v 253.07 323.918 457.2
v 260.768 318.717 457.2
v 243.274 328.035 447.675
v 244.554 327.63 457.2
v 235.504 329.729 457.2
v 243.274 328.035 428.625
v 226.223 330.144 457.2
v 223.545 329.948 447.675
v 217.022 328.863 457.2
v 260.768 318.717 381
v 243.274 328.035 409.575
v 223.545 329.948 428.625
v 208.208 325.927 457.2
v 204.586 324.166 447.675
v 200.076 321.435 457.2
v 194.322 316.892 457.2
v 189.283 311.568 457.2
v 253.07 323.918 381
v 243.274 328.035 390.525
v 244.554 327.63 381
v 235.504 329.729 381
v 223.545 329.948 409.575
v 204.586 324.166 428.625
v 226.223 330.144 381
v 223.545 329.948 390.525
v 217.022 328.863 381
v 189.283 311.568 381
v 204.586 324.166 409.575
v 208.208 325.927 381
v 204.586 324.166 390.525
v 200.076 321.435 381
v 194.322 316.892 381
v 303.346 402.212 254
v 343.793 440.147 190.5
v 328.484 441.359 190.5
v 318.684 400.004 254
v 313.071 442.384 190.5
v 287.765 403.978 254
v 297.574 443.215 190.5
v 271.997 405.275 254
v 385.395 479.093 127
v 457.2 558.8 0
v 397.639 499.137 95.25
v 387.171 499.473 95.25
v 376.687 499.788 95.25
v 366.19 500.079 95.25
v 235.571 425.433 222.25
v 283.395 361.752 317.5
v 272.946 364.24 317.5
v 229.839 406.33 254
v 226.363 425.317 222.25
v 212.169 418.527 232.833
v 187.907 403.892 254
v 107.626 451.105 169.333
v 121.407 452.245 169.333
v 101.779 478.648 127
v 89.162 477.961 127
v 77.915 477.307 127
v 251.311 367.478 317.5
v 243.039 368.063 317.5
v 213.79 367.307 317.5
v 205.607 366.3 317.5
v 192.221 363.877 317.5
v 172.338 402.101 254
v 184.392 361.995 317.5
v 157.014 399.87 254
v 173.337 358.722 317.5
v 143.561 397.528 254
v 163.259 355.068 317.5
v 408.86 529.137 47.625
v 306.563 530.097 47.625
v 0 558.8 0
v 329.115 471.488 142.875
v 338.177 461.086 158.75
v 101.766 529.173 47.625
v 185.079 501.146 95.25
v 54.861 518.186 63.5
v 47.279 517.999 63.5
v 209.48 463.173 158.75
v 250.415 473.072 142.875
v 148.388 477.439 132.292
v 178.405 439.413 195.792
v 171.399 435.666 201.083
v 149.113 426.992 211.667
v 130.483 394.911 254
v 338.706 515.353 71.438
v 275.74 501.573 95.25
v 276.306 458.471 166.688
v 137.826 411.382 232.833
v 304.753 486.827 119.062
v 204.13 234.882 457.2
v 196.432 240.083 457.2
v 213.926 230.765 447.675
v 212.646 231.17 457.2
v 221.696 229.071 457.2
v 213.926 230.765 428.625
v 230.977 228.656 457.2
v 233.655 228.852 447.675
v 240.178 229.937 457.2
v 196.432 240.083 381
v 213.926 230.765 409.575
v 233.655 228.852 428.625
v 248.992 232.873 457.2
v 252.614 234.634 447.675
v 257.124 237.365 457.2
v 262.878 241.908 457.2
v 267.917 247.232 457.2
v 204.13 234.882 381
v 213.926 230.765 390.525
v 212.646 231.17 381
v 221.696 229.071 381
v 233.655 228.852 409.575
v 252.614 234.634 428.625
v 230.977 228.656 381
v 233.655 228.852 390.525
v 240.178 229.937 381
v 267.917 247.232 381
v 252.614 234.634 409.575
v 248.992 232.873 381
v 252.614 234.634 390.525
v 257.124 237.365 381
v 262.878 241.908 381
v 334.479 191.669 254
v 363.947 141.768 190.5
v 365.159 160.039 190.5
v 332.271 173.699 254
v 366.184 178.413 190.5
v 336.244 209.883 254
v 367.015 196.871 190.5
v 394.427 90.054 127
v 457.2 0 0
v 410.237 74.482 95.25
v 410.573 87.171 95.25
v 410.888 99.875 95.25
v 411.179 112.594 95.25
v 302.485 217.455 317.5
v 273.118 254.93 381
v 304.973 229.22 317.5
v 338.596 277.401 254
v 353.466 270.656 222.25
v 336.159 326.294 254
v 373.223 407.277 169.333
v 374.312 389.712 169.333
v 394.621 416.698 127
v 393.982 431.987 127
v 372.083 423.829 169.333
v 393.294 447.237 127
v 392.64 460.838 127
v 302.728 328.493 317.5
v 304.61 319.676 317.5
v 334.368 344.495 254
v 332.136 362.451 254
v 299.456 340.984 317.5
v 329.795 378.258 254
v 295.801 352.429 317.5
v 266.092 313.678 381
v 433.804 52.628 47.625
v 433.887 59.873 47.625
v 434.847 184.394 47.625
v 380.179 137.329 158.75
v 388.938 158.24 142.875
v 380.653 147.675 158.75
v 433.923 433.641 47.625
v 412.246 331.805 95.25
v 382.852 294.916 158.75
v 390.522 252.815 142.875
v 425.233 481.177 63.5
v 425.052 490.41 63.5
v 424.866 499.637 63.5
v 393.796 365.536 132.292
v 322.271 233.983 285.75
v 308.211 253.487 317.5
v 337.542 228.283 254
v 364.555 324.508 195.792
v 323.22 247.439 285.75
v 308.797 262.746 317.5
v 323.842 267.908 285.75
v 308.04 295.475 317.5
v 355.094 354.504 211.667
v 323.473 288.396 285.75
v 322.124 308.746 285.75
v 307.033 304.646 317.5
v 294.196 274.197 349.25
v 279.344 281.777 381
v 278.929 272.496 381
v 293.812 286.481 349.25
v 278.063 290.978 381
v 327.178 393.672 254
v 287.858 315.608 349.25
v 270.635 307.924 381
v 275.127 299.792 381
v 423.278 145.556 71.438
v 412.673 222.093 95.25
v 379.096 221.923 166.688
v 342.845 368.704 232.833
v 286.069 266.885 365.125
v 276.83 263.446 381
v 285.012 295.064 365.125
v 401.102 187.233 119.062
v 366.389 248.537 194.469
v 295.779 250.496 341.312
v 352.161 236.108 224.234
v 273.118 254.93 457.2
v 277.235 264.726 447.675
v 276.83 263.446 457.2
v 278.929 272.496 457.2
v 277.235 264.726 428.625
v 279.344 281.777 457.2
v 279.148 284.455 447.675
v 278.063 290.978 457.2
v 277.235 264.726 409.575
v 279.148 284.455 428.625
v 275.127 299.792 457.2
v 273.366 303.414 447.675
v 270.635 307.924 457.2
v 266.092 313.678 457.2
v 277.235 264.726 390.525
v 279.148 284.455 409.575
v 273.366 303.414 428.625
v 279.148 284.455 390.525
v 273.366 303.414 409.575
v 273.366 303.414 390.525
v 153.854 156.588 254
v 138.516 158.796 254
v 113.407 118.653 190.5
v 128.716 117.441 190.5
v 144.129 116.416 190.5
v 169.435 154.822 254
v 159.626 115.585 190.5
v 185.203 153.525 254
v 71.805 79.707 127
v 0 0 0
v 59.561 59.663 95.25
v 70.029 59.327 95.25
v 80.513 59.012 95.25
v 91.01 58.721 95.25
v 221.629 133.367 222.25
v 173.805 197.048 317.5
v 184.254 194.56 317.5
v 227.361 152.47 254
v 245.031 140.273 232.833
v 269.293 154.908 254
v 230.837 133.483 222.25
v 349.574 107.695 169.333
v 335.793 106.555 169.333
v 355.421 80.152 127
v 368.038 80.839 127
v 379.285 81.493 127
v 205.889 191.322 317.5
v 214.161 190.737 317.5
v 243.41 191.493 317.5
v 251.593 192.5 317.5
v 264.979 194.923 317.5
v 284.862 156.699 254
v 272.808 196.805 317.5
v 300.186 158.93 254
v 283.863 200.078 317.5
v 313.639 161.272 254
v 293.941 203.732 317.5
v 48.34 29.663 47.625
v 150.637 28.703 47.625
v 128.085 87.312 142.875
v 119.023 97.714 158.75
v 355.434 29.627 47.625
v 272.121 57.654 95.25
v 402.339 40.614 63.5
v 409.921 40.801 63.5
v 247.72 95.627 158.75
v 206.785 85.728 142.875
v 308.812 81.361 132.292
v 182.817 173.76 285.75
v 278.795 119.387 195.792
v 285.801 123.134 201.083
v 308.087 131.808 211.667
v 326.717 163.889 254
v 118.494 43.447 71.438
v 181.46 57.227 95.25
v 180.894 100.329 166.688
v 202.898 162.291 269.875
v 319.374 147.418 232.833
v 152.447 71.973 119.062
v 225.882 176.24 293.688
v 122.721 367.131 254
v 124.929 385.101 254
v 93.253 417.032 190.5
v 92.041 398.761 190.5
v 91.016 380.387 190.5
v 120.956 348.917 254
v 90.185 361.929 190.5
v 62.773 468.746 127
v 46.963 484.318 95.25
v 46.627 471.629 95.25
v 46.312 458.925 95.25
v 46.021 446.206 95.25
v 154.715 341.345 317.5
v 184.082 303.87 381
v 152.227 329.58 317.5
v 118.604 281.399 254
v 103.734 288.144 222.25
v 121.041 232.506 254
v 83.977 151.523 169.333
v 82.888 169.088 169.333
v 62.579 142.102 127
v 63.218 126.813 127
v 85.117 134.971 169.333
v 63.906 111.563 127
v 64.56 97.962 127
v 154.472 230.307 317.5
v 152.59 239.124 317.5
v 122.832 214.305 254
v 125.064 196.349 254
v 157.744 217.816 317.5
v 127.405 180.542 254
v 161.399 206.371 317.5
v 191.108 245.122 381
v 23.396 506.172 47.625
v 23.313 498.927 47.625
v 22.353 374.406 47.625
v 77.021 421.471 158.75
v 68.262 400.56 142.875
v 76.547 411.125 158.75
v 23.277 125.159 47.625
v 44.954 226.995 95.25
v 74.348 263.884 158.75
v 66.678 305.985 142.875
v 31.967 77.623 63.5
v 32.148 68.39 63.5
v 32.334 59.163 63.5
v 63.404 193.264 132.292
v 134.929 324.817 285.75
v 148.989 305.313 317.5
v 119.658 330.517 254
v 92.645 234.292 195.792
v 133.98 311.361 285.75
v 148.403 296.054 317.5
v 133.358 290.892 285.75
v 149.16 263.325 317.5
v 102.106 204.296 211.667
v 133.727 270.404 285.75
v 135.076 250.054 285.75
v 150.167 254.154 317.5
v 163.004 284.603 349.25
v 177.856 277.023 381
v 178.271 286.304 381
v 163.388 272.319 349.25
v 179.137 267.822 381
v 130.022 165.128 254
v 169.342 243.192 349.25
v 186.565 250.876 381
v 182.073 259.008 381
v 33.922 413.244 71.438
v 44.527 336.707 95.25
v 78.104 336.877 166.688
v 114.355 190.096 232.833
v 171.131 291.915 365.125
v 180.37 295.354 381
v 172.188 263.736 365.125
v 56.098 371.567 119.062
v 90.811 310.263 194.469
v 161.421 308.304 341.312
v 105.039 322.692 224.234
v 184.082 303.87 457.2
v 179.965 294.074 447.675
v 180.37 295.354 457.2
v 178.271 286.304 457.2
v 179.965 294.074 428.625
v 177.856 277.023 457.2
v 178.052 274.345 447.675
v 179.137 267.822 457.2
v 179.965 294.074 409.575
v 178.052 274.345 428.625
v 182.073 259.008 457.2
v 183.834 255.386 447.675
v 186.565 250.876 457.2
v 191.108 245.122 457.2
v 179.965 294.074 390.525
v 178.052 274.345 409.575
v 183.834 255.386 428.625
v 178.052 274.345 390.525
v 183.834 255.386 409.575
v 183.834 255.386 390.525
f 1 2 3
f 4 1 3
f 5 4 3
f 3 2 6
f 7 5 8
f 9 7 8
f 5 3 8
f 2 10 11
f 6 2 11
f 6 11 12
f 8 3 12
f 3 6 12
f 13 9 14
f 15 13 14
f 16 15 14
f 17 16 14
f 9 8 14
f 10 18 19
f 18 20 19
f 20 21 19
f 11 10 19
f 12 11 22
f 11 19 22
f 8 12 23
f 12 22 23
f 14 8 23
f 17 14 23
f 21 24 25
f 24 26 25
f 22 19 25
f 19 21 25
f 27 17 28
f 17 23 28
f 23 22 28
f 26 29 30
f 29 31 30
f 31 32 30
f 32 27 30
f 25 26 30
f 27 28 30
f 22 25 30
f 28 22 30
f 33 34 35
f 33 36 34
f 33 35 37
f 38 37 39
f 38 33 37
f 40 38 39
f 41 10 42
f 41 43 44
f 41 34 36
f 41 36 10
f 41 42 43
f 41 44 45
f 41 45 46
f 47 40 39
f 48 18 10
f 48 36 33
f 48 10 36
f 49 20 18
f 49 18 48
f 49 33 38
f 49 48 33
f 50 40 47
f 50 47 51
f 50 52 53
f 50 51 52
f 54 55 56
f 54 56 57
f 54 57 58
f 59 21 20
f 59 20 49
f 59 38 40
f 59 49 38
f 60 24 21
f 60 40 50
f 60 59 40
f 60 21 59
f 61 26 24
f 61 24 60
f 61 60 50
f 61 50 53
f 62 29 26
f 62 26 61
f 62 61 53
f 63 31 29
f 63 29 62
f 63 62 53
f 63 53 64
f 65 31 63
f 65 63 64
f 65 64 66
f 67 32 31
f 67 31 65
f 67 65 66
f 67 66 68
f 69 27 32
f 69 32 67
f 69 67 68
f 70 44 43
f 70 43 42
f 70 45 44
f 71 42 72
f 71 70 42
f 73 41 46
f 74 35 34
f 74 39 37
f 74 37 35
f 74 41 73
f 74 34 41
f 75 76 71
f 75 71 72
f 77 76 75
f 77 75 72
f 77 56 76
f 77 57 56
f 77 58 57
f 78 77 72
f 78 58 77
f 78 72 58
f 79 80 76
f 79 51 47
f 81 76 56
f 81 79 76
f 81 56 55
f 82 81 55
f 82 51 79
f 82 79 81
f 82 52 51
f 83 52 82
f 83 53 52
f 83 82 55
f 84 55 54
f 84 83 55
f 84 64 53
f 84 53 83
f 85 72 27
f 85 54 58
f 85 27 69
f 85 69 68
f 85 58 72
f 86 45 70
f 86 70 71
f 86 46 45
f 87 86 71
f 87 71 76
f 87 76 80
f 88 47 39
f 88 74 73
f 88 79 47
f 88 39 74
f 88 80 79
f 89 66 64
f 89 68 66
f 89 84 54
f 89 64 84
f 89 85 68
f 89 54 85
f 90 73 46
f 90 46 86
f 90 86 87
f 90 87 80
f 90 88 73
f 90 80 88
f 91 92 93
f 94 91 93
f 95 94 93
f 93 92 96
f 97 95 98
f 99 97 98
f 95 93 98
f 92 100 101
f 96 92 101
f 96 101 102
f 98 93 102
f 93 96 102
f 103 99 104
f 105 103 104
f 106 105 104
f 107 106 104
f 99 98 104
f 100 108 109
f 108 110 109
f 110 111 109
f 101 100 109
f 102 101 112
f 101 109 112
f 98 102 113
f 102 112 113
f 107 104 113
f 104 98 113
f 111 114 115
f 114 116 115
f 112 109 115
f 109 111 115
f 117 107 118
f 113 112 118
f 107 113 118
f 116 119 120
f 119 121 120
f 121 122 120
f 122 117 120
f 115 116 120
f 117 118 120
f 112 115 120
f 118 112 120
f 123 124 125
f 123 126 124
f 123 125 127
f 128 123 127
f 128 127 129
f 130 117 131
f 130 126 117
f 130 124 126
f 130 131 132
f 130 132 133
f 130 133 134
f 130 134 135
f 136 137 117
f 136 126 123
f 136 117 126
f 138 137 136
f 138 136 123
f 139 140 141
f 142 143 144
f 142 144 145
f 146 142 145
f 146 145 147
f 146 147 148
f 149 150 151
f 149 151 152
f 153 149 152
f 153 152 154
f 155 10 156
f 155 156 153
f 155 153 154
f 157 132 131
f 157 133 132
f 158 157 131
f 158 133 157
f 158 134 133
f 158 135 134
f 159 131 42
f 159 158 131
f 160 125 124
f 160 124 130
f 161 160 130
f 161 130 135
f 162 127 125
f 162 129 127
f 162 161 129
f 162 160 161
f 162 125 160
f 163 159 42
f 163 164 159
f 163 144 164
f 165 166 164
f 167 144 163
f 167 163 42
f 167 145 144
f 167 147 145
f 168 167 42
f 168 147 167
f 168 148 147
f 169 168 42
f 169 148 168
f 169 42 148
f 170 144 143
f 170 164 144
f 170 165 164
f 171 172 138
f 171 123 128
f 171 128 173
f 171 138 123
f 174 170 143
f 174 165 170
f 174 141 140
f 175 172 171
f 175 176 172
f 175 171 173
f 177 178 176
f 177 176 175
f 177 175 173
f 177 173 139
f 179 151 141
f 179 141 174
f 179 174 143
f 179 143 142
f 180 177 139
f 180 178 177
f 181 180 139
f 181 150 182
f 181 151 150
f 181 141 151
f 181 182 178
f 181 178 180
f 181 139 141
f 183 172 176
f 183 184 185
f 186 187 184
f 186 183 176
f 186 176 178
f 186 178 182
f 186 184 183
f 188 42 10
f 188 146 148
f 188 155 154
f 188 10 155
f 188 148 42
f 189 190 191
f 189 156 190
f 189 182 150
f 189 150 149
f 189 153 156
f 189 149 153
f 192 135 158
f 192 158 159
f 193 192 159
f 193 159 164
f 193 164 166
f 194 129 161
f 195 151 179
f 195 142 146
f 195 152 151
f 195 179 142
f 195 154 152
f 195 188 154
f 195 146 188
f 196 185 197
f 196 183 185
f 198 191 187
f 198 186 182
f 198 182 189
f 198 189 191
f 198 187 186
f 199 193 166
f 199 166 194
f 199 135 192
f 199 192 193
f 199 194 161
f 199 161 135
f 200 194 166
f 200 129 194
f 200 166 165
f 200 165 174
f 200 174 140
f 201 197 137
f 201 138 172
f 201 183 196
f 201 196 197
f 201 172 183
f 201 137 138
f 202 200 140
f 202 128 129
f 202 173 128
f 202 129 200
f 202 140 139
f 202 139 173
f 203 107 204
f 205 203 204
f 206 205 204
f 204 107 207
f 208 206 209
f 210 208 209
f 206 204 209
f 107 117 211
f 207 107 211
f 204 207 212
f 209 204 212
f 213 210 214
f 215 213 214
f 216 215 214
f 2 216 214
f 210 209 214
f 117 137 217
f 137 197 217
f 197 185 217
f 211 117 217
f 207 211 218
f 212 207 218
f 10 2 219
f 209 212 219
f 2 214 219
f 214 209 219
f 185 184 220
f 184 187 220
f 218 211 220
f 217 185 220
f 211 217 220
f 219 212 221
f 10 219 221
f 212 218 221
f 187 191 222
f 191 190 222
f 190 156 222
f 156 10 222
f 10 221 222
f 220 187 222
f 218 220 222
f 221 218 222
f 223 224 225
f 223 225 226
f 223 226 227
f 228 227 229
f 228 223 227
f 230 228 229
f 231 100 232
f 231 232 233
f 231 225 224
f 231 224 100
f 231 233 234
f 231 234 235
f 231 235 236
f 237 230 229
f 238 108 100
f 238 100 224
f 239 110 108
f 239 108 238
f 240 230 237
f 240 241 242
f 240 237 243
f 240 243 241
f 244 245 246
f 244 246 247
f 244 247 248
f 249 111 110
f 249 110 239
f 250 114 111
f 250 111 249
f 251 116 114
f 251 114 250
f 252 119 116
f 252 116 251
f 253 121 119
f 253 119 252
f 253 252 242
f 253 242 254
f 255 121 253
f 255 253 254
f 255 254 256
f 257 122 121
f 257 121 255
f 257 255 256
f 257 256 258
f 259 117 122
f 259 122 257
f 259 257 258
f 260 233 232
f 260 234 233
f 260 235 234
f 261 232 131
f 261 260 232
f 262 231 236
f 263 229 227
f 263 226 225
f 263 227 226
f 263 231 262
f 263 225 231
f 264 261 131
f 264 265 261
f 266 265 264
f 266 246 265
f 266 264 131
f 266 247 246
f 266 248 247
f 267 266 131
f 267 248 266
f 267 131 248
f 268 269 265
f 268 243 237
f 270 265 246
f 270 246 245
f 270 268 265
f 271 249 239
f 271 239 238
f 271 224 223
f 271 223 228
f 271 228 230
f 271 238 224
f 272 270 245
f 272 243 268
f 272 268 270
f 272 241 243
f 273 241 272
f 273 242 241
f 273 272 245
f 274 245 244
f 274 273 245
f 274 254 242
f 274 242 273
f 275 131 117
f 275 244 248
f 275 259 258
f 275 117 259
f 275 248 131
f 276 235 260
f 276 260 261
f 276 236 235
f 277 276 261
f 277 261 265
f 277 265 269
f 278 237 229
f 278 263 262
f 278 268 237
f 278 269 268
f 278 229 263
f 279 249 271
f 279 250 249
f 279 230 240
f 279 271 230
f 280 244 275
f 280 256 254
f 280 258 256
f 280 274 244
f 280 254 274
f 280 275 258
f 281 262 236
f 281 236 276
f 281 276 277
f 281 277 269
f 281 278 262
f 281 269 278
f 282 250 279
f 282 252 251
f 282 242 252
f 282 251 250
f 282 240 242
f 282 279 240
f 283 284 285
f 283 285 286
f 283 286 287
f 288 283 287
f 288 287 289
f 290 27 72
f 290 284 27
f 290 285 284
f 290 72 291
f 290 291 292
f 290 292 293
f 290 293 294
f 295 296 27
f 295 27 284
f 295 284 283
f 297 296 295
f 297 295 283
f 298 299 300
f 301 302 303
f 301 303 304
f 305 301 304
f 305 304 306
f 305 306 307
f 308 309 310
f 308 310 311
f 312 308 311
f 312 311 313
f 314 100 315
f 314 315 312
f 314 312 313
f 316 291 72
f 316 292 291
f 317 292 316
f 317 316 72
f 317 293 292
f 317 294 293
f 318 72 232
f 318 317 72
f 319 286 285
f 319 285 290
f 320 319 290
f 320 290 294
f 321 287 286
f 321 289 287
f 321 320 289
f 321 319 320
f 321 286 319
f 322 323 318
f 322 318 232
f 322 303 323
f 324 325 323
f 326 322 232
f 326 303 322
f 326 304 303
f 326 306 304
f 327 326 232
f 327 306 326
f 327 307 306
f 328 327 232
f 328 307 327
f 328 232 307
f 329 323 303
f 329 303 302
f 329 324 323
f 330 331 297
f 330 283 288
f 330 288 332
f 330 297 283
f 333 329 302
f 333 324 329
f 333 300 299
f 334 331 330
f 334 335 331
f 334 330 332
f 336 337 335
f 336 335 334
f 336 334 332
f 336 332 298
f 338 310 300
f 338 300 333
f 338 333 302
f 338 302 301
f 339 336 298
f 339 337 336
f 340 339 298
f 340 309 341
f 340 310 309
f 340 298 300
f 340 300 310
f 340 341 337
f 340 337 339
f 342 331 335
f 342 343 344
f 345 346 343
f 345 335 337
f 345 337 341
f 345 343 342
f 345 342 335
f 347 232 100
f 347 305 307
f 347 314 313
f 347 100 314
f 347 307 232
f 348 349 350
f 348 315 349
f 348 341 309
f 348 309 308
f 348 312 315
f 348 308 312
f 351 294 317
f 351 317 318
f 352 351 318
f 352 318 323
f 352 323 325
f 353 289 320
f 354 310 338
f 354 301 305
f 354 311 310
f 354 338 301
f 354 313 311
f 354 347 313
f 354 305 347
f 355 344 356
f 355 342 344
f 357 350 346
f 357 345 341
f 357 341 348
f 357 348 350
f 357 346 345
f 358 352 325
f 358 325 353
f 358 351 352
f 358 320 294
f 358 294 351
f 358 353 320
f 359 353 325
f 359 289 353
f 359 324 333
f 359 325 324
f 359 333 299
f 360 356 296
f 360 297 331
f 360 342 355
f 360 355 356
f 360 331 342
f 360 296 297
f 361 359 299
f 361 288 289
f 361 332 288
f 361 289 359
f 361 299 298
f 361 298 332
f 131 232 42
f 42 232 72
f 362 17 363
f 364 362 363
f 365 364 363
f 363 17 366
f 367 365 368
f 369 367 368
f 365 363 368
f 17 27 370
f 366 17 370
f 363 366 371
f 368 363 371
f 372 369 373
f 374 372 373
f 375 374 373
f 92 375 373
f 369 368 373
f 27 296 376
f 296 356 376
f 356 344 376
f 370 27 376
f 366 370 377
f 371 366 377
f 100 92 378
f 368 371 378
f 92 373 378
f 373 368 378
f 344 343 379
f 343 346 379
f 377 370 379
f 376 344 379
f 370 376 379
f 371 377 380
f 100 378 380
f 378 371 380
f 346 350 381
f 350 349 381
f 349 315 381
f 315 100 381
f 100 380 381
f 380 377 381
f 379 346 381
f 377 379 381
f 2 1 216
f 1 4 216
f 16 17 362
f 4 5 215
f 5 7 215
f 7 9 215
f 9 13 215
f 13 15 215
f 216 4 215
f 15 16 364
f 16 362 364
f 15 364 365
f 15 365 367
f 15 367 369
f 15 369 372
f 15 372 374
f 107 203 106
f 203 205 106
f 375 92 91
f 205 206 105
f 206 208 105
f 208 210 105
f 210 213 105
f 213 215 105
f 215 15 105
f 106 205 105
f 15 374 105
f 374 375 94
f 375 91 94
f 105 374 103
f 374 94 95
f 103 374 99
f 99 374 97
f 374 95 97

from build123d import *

# Parameters (mm, degrees)
F0_W     = 457.2
F0_H     = 558.8
F4_DEPTH = 76.2


# Not quite as in the source:
# - the arcs of a loft's sections are written as splines that run evenly, so that the points pair up as in the source's solid


with BuildPart() as f3:
    # F0 (on Top) → F3 section 0
    with BuildSketch(Plane.XY):
        with Locations((228.6, 279.4)):
            Rectangle(F0_W, F0_H)
    # F2 (on offset) → F3 section 1
    with BuildSketch(Plane.XY.offset(381)):
        with BuildLine():
            add(Edge.make_bspline(
                [(196.4315202549, 240.0829692005), (199.0048139033, 237.9775471245), (201.7854047693, 236.125618145), (207.6545967757, 232.9997335558), (210.7430527889, 231.7258552398), (217.1092997477, 229.805056205), (220.3869332755, 229.1581829817), (227.0055838864, 228.516284731), (230.3464373104, 228.5212755757), (236.9631405421, 229.1829458989), (240.2388267389, 229.8396090163), (246.599306397, 231.7794202939), (249.6839425829, 233.0625204885), (255.5437690011, 236.205926861), (258.3188143375, 238.066155312), (263.4527976727, 242.2923574354), (265.8116087236, 244.6582266066), (267.9170307995, 247.2315202549)],
                knots=[0, 0, 0, 0, 0.125, 0.125, 0.25, 0.25, 0.375, 0.375, 0.5, 0.5, 0.625, 0.625, 0.75, 0.75, 0.875, 0.875, 1, 1, 1, 1], degree=3))
            add(Edge.make_bspline(
                [(267.9170307995, 247.2315202549), (270.0224528755, 249.8048139033), (271.874381855, 252.5854047693), (275.0002664442, 258.4545967757), (276.2741447602, 261.5430527889), (278.194943795, 267.9092997477), (278.8418170183, 271.1869332755), (279.483715269, 277.8055838864), (279.4787244243, 281.1464373104), (278.8170541011, 287.7631405421), (278.1603909837, 291.0388267389), (276.2205797061, 297.399306397), (274.9374795115, 300.4839425829), (271.794073139, 306.3437690011), (269.933844688, 309.1188143375), (265.7076425646, 314.2527976727), (263.3417733934, 316.6116087236), (260.7684797451, 318.7170307995)],
                knots=[0, 0, 0, 0, 0.125, 0.125, 0.25, 0.25, 0.375, 0.375, 0.5, 0.5, 0.625, 0.625, 0.75, 0.75, 0.875, 0.875, 1, 1, 1, 1], degree=3))
            add(Edge.make_bspline(
                [(260.7684797451, 318.7170307995), (258.1951860967, 320.8224528755), (255.4145952307, 322.674381855), (249.5454032243, 325.8002664442), (246.4569472111, 327.0741447602), (240.0907002523, 328.994943795), (236.8130667245, 329.6418170183), (230.1944161136, 330.283715269), (226.8535626896, 330.2787244243), (220.2368594579, 329.6170541011), (216.9611732611, 328.9603909837), (210.600693603, 327.0205797061), (207.5160574171, 325.7374795115), (201.6562309989, 322.594073139), (198.8811856625, 320.733844688), (193.7472023273, 316.5076425646), (191.3883912764, 314.1417733934), (189.2829692005, 311.5684797451)],
                knots=[0, 0, 0, 0, 0.125, 0.125, 0.25, 0.25, 0.375, 0.375, 0.5, 0.5, 0.625, 0.625, 0.75, 0.75, 0.875, 0.875, 1, 1, 1, 1], degree=3))
            add(Edge.make_bspline(
                [(189.2829692005, 311.5684797451), (187.1775471245, 308.9951860967), (185.325618145, 306.2145952307), (182.1997335558, 300.3454032243), (180.9258552398, 297.2569472111), (179.005056205, 290.8907002523), (178.3581829817, 287.6130667245), (177.716284731, 280.9944161136), (177.7212755757, 277.6535626896), (178.3829458989, 271.0368594579), (179.0396090163, 267.7611732611), (180.9794202939, 261.400693603), (182.2625204885, 258.3160574171), (185.405926861, 252.4562309989), (187.266155312, 249.6811856625), (191.4923574354, 244.5472023273), (193.8582266066, 242.1883912764), (196.4315202549, 240.0829692005)],
                knots=[0, 0, 0, 0, 0.125, 0.125, 0.25, 0.25, 0.375, 0.375, 0.5, 0.5, 0.625, 0.625, 0.75, 0.75, 0.875, 0.875, 1, 1, 1, 1], degree=3))
        make_face()
    loft(ruled=True)

    # F4 (add): a face of the model
    f4_faces = [f3.faces().sort_by_distance(p)[0] for p in [
        (228.6, 279.4, 381),
    ]]
    extrude(f4_faces, amount=F4_DEPTH)


solid = f3.part
